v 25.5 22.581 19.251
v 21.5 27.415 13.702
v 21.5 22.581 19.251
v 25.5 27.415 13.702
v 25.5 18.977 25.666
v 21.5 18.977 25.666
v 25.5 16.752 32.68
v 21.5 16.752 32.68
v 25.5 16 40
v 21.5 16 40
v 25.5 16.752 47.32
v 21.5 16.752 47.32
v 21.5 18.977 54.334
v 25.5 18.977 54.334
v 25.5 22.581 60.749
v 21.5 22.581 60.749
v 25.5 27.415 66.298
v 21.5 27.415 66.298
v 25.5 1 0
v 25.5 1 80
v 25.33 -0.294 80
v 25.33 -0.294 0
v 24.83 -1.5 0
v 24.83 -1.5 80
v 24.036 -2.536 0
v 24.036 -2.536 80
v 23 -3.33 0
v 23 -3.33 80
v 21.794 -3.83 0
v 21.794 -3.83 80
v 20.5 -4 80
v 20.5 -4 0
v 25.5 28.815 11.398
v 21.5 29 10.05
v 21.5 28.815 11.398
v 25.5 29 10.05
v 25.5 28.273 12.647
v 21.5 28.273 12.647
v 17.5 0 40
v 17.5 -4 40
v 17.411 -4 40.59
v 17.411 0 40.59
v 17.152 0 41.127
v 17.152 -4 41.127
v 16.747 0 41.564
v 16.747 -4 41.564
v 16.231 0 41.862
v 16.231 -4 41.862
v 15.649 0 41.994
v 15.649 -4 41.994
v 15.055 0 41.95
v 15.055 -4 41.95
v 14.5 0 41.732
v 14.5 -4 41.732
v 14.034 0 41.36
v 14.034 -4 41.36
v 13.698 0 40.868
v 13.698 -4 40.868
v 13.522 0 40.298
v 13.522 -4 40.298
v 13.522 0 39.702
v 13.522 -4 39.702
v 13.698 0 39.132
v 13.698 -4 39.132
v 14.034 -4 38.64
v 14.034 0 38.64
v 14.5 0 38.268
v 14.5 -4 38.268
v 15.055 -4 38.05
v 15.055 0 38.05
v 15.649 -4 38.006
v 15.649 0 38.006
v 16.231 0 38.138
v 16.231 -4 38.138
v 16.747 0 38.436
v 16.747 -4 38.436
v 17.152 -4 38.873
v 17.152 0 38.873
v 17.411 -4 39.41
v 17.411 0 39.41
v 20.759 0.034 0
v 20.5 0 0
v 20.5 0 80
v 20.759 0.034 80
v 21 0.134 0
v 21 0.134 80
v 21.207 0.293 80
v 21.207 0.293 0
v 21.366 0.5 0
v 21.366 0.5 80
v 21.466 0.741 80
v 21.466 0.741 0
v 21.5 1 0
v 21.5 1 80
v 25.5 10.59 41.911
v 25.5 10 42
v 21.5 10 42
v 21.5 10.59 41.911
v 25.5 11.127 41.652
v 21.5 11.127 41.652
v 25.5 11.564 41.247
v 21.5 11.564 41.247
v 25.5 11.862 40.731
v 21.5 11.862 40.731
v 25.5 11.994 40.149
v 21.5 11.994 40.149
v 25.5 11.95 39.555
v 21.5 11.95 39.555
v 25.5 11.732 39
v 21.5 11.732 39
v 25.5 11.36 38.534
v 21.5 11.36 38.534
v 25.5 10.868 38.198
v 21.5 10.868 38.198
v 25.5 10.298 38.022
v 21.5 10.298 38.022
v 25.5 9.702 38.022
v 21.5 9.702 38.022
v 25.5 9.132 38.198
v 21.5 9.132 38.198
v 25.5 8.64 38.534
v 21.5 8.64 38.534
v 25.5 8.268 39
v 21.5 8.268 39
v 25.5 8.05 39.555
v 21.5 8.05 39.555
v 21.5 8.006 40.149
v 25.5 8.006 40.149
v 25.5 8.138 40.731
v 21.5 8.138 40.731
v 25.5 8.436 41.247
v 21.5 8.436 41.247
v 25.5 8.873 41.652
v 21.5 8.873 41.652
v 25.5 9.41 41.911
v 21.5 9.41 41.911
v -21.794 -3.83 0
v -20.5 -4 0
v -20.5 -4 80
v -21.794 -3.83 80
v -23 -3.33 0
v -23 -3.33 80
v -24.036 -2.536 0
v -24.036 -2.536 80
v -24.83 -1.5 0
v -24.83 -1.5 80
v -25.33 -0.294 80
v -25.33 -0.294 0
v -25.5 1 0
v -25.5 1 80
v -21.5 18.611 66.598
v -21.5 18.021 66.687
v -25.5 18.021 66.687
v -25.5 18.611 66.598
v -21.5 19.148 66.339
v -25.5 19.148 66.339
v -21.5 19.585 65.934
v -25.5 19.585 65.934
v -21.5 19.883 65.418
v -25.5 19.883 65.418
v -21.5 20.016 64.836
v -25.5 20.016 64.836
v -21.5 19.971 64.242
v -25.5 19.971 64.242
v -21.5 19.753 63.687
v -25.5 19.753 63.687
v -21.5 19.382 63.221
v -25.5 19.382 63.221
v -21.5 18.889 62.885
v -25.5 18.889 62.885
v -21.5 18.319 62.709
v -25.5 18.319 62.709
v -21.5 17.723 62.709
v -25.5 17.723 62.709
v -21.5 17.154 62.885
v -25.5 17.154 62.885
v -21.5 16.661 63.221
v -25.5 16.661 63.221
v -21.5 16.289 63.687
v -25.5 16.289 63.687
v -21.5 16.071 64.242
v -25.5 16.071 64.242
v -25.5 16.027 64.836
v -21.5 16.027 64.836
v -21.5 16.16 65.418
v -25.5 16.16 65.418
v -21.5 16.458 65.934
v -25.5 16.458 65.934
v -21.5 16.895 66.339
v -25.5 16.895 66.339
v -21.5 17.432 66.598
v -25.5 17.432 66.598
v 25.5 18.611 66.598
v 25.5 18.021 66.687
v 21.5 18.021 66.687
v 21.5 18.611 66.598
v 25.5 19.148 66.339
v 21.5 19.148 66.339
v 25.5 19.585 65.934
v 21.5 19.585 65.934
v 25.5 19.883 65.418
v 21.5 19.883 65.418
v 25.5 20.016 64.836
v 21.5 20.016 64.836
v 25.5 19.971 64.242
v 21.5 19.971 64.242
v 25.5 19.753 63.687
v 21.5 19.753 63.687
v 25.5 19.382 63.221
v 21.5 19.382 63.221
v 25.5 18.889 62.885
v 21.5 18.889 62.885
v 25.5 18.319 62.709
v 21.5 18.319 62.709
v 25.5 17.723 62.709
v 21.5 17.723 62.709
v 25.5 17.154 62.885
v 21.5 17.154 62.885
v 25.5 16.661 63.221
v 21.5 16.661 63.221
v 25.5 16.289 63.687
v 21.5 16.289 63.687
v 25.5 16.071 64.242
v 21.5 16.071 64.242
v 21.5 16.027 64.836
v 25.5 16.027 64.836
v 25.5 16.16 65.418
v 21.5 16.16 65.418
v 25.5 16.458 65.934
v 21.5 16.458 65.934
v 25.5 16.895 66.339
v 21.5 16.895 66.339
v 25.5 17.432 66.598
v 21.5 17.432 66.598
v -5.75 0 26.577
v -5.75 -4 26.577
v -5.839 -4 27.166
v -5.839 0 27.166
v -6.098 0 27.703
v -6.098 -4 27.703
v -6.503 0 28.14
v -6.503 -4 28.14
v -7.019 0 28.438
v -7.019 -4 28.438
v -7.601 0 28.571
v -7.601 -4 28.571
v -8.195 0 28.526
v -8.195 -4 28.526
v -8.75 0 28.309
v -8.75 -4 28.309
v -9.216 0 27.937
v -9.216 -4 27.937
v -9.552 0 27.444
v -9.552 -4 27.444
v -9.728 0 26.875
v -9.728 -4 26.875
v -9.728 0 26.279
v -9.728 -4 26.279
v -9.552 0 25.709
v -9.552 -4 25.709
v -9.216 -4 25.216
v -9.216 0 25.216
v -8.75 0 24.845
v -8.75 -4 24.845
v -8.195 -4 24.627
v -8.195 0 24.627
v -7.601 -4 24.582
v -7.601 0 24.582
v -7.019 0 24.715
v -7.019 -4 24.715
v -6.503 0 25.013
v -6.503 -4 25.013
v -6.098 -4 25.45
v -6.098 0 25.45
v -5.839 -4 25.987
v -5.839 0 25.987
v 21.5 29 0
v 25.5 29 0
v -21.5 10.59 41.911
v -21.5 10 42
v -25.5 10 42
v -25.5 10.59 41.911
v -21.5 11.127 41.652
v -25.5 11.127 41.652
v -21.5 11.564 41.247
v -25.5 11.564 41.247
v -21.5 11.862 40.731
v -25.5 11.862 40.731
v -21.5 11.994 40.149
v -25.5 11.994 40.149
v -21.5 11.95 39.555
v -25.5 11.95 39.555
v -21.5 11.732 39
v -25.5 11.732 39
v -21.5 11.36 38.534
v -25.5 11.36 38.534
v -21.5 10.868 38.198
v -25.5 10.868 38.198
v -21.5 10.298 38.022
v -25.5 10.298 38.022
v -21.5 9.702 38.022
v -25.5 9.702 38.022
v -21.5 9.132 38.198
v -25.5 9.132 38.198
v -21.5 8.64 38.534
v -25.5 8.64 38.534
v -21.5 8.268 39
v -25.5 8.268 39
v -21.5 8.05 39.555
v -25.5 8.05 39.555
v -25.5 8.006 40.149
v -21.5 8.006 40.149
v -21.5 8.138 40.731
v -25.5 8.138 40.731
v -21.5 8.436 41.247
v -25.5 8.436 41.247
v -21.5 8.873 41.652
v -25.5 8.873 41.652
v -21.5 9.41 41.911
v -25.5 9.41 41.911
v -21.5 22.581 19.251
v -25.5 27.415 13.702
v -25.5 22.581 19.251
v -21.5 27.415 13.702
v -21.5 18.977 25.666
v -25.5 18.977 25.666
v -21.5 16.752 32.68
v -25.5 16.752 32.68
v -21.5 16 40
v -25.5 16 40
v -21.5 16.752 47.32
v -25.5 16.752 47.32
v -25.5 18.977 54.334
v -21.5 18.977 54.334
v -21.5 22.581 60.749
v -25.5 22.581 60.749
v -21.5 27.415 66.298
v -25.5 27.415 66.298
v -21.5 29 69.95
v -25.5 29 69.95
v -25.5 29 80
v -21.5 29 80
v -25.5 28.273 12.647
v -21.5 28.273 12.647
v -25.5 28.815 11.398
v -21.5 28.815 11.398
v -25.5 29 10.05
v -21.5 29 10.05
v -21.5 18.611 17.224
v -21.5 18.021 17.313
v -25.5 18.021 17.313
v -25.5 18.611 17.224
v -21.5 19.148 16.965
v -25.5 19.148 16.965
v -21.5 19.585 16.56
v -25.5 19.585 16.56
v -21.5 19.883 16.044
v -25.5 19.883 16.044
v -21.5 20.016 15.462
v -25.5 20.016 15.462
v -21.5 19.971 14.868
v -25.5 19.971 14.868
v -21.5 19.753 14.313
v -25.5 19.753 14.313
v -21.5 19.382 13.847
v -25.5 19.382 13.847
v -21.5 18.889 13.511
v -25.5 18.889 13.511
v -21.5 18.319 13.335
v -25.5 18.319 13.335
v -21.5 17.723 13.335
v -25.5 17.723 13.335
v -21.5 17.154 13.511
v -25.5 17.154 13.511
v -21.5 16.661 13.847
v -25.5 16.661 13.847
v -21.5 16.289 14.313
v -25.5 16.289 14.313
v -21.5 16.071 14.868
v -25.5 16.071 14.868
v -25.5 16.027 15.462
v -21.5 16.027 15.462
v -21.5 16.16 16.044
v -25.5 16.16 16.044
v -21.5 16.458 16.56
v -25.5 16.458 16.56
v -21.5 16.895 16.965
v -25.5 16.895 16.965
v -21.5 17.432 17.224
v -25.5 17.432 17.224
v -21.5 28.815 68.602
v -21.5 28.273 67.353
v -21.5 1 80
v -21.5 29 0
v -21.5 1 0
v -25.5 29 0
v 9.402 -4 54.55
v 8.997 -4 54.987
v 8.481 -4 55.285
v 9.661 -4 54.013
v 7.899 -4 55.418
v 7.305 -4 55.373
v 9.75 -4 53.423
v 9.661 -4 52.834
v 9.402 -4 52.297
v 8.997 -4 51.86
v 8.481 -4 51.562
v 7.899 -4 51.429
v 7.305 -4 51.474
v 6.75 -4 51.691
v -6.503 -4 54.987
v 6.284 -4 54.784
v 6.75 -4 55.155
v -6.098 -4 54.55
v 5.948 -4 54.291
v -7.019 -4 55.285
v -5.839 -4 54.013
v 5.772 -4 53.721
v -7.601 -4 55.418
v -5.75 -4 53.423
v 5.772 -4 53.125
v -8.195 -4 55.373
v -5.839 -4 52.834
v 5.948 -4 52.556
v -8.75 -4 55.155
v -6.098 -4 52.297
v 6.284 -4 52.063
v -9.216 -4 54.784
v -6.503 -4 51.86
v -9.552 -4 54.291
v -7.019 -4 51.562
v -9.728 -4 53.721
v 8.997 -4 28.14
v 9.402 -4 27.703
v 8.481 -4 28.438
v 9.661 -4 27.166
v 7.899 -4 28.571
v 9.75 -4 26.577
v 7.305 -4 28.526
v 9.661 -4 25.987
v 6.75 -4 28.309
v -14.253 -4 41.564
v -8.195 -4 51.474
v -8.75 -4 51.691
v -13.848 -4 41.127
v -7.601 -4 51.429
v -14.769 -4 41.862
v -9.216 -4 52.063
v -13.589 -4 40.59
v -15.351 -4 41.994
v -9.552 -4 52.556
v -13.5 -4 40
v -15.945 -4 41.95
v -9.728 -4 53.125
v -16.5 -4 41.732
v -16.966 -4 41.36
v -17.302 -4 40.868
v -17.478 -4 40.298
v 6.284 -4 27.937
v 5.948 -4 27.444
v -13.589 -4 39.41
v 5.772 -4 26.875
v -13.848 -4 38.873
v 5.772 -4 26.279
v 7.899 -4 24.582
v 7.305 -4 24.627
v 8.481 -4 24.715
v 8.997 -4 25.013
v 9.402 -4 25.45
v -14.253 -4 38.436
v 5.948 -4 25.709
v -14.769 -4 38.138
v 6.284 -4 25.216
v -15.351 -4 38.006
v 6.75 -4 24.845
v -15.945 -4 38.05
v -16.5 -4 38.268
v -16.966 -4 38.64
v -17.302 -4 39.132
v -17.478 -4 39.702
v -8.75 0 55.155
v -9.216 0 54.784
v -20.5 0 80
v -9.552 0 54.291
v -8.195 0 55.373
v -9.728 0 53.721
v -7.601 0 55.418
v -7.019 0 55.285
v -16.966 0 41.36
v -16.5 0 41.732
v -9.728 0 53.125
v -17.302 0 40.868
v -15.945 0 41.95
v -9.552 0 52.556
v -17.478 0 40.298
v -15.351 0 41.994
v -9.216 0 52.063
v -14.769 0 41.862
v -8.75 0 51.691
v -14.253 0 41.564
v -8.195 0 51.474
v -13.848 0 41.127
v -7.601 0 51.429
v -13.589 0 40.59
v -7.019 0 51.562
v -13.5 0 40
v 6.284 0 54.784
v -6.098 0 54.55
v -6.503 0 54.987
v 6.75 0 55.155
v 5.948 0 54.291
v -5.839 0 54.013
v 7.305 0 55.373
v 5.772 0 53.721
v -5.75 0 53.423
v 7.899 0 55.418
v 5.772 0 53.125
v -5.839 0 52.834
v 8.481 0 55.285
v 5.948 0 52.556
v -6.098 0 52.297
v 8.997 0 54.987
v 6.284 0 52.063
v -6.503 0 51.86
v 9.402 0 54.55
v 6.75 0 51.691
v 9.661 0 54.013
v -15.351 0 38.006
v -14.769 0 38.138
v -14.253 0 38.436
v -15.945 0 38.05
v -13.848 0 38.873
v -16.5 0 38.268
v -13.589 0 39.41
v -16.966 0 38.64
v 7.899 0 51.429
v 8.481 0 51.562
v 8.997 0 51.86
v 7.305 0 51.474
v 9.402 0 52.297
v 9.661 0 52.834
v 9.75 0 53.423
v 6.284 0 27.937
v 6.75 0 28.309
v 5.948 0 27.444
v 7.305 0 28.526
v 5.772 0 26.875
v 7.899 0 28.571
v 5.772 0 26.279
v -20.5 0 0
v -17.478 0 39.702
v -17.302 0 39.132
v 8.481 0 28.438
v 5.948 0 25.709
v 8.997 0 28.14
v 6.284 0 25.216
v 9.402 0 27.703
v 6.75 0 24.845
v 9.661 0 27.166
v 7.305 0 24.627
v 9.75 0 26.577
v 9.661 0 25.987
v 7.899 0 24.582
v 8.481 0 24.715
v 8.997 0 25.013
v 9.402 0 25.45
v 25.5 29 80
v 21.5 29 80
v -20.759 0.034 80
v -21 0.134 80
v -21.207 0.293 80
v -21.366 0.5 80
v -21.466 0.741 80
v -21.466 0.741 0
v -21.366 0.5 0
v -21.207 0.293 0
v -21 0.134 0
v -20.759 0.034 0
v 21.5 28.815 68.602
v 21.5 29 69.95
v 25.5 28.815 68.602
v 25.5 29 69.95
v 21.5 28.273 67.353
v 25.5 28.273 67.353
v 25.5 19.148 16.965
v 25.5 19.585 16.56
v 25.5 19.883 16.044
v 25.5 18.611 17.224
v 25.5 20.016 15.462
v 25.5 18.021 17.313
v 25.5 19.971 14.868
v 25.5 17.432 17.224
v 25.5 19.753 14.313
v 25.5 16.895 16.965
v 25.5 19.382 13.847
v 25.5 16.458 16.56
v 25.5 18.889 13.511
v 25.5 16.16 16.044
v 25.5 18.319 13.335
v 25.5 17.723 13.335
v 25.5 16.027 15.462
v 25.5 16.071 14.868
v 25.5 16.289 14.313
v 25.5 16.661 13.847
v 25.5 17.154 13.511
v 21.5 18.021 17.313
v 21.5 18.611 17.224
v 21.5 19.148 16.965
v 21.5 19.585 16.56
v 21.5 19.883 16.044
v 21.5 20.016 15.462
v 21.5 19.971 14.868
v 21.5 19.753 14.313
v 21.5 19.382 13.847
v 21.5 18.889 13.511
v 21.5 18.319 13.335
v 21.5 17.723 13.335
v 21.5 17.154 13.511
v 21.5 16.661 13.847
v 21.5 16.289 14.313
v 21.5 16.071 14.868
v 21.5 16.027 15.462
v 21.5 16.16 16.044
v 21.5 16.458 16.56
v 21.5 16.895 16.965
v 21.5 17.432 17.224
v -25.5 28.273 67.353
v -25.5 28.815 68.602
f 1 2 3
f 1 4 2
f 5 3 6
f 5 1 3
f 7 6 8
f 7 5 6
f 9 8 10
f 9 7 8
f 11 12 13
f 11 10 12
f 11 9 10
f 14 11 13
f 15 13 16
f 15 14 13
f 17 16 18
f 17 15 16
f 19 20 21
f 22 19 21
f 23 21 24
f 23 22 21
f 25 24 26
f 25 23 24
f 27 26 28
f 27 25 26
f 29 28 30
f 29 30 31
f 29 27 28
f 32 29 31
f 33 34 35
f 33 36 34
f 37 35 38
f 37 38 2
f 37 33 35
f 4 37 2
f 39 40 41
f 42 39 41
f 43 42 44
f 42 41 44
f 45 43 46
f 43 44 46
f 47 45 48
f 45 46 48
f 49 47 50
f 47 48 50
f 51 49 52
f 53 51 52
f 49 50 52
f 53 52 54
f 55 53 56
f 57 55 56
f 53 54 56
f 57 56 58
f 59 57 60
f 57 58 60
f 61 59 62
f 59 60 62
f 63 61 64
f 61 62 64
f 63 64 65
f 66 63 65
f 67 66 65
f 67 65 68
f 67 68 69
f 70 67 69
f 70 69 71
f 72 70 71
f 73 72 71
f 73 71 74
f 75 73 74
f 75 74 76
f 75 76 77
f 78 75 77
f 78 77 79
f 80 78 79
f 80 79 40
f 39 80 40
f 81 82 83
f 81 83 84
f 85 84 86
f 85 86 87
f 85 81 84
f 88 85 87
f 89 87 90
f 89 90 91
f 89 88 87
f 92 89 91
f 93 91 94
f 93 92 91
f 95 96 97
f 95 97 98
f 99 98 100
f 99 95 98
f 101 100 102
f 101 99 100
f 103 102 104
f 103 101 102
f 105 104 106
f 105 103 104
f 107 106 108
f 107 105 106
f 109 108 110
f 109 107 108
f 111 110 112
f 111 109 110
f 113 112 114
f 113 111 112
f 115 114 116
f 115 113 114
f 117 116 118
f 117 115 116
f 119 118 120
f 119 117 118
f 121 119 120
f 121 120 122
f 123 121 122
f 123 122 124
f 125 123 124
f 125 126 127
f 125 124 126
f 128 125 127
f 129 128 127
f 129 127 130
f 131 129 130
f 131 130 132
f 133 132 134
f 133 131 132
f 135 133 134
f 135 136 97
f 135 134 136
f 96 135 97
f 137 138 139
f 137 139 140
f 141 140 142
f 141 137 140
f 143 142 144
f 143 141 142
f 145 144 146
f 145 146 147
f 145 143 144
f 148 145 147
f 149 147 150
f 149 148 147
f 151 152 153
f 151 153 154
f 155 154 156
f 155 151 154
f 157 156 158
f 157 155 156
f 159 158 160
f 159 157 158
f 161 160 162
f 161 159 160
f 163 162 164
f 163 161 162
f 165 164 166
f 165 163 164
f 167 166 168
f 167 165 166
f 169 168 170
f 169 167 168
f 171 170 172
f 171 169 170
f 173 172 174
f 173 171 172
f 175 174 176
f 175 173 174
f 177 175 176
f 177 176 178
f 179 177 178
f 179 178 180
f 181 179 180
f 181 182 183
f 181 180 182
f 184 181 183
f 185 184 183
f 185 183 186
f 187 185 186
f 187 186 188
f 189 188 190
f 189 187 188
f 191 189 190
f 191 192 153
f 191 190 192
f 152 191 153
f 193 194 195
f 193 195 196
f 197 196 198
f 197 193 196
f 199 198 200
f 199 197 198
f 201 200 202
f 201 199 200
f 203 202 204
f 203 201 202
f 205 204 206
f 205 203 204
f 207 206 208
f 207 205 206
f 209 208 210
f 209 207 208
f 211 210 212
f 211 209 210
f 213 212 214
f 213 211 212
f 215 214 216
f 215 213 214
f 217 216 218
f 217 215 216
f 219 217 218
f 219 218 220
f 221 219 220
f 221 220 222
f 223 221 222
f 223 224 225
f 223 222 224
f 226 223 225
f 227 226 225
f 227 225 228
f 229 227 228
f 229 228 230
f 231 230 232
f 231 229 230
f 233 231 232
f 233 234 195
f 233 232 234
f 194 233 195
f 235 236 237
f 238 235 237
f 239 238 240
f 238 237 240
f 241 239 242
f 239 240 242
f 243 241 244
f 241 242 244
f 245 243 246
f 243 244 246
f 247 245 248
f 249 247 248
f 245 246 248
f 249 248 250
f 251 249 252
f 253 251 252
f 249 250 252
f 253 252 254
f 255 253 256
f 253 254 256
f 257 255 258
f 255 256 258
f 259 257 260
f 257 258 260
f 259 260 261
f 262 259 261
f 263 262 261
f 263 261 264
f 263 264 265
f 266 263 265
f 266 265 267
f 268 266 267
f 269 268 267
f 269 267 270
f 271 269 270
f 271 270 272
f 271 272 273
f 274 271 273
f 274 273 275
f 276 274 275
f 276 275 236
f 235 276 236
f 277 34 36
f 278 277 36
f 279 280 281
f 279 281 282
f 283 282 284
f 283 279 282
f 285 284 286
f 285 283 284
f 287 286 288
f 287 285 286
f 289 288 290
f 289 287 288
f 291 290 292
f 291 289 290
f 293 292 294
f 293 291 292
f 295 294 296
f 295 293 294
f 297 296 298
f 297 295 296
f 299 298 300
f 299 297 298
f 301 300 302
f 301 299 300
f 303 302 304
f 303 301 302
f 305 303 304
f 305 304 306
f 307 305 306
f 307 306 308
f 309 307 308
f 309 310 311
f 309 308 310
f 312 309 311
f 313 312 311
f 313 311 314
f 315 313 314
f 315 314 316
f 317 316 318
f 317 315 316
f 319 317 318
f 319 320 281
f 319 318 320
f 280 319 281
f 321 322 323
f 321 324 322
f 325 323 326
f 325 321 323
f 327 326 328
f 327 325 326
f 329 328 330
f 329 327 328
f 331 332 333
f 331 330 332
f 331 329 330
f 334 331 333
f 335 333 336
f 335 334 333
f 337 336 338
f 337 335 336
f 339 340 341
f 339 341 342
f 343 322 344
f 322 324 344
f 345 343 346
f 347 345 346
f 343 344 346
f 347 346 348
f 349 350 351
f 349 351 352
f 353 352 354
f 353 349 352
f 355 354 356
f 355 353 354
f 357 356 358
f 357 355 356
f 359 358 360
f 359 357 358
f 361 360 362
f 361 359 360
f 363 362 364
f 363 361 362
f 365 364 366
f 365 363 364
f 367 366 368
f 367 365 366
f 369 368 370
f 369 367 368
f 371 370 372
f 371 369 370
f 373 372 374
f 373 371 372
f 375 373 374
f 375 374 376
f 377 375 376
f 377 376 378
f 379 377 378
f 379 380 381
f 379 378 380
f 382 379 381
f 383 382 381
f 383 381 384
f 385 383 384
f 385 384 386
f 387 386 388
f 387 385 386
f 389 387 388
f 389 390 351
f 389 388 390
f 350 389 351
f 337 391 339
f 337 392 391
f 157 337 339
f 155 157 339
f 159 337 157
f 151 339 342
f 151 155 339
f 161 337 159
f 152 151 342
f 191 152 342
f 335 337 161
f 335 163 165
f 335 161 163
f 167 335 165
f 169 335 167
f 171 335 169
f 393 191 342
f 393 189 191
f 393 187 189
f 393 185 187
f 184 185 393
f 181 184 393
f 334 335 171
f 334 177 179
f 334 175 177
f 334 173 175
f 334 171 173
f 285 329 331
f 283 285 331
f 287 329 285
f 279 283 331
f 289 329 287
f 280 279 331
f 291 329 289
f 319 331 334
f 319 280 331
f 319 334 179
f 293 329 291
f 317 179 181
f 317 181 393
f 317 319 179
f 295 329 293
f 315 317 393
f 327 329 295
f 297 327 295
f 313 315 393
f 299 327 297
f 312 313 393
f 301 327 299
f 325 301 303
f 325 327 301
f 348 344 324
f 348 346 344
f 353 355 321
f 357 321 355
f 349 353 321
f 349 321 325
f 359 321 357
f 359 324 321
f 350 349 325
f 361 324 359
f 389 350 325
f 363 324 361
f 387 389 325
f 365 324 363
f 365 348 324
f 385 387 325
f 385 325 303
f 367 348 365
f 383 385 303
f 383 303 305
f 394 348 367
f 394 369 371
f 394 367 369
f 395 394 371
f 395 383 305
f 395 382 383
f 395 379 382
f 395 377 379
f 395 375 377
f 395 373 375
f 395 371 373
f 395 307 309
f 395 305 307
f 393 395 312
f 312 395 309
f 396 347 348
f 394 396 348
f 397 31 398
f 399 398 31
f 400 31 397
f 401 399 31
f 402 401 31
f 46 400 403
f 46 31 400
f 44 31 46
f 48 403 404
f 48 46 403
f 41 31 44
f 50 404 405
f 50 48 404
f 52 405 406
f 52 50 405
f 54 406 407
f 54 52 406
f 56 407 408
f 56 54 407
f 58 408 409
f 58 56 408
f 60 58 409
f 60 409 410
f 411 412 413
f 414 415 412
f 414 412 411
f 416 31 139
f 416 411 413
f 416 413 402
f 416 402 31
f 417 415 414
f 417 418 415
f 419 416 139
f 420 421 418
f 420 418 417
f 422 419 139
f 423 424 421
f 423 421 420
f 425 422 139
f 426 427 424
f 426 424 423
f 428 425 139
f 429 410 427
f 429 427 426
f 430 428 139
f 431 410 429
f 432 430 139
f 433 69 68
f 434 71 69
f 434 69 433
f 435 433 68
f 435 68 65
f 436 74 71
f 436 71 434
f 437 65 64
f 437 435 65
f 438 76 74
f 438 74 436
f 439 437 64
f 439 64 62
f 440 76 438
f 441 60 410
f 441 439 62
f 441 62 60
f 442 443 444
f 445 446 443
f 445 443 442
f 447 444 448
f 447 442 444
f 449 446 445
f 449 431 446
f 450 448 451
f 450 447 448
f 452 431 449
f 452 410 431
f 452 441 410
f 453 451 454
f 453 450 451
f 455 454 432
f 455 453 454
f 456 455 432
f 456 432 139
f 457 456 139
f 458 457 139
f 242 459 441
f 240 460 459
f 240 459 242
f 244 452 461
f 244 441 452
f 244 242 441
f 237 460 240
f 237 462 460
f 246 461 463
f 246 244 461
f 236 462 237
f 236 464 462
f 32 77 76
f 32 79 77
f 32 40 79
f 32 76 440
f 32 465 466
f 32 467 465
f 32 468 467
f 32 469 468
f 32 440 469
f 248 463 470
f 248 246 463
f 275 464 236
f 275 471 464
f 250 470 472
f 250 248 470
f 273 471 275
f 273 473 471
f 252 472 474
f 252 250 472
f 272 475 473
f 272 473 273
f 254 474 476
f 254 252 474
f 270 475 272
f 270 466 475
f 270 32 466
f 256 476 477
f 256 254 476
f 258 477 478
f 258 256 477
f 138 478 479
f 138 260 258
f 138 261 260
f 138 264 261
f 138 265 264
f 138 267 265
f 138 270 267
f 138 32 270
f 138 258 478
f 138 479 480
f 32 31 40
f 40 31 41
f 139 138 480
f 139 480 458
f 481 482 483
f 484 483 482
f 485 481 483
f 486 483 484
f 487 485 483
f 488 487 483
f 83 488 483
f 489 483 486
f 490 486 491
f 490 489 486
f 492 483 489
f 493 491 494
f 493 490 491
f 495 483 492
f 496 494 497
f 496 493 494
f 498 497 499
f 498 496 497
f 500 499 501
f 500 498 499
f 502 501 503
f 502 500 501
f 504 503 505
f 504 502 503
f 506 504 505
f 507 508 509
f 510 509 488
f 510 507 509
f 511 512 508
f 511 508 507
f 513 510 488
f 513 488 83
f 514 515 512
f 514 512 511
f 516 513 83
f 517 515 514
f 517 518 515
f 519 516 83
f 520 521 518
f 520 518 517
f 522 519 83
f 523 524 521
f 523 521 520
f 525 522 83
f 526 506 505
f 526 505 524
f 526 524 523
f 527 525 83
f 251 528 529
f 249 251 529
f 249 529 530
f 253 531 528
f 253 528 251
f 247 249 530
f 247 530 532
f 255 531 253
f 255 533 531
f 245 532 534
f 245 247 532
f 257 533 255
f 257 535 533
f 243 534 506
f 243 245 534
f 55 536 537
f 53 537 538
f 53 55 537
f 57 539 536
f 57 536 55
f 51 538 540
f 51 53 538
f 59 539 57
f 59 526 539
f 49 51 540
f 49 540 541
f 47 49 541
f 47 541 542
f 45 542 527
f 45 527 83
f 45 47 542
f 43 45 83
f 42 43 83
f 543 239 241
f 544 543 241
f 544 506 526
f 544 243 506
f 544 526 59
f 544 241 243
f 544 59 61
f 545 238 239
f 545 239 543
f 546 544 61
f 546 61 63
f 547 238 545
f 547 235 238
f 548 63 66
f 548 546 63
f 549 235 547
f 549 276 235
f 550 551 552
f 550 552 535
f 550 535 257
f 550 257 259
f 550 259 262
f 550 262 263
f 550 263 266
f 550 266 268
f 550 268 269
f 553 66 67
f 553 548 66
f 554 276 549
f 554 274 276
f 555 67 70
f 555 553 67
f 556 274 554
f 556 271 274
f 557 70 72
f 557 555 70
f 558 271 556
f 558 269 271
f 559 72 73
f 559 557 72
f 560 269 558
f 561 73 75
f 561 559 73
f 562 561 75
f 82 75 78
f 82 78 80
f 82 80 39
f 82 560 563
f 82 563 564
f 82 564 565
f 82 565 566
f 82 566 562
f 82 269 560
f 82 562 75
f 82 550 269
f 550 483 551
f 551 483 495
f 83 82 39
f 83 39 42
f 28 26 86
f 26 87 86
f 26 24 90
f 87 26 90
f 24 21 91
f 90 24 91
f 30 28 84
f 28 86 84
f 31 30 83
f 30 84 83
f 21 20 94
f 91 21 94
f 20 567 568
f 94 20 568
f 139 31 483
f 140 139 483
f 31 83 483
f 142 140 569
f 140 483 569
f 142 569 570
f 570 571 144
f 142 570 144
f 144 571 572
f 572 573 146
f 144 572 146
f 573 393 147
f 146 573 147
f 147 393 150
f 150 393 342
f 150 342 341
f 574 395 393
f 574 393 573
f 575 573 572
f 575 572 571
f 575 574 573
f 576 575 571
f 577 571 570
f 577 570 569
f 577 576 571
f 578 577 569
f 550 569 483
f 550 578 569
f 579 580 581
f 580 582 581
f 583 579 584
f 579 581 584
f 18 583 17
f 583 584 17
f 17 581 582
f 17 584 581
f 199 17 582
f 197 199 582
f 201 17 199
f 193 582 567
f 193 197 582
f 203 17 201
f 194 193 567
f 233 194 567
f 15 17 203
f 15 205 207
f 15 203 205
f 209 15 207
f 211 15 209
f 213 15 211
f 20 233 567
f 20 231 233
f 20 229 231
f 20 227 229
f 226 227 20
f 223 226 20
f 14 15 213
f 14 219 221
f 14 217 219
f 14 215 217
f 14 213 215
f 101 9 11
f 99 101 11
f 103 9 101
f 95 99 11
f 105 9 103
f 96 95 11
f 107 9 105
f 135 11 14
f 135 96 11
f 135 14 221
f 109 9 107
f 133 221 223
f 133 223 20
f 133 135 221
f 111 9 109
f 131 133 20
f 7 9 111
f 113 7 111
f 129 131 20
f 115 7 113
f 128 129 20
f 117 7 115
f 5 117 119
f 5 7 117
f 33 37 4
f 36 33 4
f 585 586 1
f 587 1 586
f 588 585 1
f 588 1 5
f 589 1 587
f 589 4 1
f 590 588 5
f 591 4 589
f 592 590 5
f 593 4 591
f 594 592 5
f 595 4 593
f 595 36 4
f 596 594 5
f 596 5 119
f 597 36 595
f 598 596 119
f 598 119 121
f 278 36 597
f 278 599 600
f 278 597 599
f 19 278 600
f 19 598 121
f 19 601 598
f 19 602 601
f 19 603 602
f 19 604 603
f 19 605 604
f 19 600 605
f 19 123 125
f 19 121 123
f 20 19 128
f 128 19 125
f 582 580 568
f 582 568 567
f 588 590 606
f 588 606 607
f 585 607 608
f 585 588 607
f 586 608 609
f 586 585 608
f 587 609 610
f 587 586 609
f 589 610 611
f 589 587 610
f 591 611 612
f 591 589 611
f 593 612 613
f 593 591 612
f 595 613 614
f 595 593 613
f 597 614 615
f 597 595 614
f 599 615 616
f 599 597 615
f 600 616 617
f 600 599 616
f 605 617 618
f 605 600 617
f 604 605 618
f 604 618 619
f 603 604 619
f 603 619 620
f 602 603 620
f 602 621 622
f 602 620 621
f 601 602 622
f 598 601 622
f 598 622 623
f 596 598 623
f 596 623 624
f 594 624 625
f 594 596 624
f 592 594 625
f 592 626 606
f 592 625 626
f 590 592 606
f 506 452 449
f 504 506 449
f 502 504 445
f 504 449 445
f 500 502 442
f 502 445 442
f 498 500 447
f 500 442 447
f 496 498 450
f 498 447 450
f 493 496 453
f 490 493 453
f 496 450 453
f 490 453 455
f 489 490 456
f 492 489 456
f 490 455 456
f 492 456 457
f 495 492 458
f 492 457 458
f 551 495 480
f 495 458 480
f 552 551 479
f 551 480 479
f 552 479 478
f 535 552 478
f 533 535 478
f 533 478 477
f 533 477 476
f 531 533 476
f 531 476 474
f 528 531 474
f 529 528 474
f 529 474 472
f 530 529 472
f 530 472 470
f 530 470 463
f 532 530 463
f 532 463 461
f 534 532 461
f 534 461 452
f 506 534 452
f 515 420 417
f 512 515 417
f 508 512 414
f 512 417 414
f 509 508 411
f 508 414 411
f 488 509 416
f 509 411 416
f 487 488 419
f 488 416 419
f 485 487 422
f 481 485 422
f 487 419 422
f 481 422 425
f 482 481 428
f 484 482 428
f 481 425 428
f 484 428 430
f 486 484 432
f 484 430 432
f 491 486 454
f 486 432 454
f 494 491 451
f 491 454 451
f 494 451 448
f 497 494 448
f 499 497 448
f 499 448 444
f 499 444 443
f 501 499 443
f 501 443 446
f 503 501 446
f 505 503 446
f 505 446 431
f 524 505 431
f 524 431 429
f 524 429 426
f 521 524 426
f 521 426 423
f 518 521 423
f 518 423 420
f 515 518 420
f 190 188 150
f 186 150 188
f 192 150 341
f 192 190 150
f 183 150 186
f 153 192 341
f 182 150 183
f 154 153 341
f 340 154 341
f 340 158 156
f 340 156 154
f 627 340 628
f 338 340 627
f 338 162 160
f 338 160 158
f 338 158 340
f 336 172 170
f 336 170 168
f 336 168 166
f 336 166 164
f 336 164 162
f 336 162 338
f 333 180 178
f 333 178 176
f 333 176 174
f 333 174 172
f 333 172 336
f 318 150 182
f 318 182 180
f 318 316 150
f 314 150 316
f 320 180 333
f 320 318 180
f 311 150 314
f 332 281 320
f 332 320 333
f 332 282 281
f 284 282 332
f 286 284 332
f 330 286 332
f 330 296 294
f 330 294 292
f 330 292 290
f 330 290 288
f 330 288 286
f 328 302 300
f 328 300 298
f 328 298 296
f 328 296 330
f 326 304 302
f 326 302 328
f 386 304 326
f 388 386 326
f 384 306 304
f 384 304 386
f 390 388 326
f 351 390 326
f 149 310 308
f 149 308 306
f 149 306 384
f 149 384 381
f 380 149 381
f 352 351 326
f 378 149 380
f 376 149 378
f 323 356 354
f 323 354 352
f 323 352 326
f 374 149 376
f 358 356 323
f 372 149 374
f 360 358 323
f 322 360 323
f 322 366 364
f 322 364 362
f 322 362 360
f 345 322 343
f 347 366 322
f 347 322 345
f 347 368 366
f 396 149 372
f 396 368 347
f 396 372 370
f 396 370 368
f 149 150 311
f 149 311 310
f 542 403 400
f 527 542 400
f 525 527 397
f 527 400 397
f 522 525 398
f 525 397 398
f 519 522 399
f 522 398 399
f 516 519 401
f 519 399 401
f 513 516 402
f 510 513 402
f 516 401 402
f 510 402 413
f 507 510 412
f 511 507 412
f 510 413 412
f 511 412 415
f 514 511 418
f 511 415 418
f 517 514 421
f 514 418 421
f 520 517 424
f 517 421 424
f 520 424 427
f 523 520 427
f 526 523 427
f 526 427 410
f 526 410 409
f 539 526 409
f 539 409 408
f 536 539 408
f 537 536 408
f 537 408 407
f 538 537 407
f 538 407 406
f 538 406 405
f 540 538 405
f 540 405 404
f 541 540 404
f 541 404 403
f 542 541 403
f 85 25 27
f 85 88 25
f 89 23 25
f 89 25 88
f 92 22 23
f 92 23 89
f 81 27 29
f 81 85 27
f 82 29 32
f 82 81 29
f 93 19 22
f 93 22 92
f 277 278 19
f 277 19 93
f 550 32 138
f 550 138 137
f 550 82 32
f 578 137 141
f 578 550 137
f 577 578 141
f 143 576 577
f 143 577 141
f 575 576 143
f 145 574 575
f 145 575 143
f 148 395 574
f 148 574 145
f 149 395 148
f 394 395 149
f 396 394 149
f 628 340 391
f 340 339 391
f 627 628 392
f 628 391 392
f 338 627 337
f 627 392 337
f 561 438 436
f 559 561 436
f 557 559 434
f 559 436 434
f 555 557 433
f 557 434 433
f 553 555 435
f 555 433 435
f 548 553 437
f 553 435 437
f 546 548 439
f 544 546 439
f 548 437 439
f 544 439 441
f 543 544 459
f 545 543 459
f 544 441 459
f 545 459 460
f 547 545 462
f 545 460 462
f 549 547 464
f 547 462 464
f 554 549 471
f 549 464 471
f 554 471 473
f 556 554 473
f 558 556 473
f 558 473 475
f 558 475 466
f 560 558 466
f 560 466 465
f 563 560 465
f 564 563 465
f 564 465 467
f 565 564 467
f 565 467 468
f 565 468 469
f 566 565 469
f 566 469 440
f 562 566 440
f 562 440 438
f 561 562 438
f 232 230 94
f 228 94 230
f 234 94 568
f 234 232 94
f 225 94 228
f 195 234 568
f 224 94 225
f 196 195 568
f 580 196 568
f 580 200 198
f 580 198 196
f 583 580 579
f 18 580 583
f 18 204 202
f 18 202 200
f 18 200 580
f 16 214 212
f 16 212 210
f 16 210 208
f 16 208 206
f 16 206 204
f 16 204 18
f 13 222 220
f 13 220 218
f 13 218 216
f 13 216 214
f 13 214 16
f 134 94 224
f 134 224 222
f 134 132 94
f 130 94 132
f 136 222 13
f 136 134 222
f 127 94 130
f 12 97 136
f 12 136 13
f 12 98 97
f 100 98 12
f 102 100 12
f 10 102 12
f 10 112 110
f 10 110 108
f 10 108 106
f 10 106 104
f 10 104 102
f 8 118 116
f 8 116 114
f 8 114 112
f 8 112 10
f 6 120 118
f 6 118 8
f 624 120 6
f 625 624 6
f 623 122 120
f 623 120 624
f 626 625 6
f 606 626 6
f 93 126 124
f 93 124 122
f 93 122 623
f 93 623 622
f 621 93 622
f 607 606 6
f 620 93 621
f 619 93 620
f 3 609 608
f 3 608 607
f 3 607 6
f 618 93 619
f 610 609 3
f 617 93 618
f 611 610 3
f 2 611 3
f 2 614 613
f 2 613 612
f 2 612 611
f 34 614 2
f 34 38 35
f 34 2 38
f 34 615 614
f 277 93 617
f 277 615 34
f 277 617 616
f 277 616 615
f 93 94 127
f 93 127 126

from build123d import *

# Parameters (mm, degrees)
SM_BASE_FLANGE_1_DEPTH   = 80
CUT_EXTRUDE_3_DEPTH      = 100.206854602
CUT_EXTRUDE_3_DEPTH_BACK = 100.206854602
SKETCH_6_R               = 36
SKETCH_6_R_2             = 2
FILLET_1_R               = 5
SKETCH_9_R               = 2
CUT_EXTRUDE_4_DEPTH      = 91.217792037


# Sheet-metal steps are written as plain solids
with BuildPart() as part:
    # Sketch 1 → Базовая кромка1 (new body)
    with BuildSketch(Plane.XY):
        with BuildLine():
            Line((-21.5, 29), (-21.5, 1))
            ThreePointArc((-21.5, 1), (-21.207106781, 0.292893219), (-20.5, 0))
            Line((-20.5, 0), (20.5, 0))
            ThreePointArc((20.5, 0), (21.207106781, 0.292893219), (21.5, 1))
            Line((21.5, 1), (21.5, 29))
            Line((21.5, 29), (25.5, 29))
            Line((25.5, 29), (25.5, 1))
            ThreePointArc((25.5, 1), (24.035533906, -2.535533906), (20.5, -4))
            Line((20.5, -4), (-20.5, -4))
            ThreePointArc((-20.5, -4), (-24.035533906, -2.535533906), (-25.5, 1))
            Line((-25.5, 1), (-25.5, 29))
            Line((-25.5, 29), (-21.5, 29))
        make_face()
    extrude(amount=SM_BASE_FLANGE_1_DEPTH)

    # Эскиз6 → Вырез-Вытянуть3 (cut, two sides: drawn at the far end of the back side and taken through both)
    with BuildSketch(Plane.ZY.offset(25.5).offset(-CUT_EXTRUDE_3_DEPTH_BACK)):
        with Locations((40, 52)):
            Circle(SKETCH_6_R)
        with Locations((40, 10)):
            Circle(SKETCH_6_R_2)
        with Locations((15.313019404, 18.021286236)):
            Circle(SKETCH_6_R_2)
        with Locations((64.686980596, 18.021286236)):
            Circle(SKETCH_6_R_2)
    extrude(amount=CUT_EXTRUDE_3_DEPTH + CUT_EXTRUDE_3_DEPTH_BACK, mode=Mode.SUBTRACT)

    # Скругление1
    fillet_1_edges = [part.edges().sort_by_distance(p)[0] for p in [
        (23.5, 29, 12.305235152),
        (23.5, 29, 67.694764848),
        (-23.5, 29, 12.305235152),
        (-23.5, 29, 67.694764848),
    ]]
    fillet(fillet_1_edges, radius=FILLET_1_R)

    # Эскиз9 → Вырез-Вытянуть4 (cut, through all)
    with BuildSketch(Plane.XZ.offset(4)):
        with Locations((15.5, 40)):
            Circle(SKETCH_9_R)
        with Locations((7.75, 26.576606241)):
            Circle(SKETCH_9_R)
        with Locations((-7.75, 26.576606241)):
            Circle(SKETCH_9_R)
        with Locations((-15.5, 40)):
            Circle(SKETCH_9_R)
        with Locations((-7.75, 53.423393759)):
            Circle(SKETCH_9_R)
        with Locations((7.75, 53.423393759)):
            Circle(SKETCH_9_R)
    extrude(amount=-CUT_EXTRUDE_4_DEPTH, mode=Mode.SUBTRACT)


solid = part.part
